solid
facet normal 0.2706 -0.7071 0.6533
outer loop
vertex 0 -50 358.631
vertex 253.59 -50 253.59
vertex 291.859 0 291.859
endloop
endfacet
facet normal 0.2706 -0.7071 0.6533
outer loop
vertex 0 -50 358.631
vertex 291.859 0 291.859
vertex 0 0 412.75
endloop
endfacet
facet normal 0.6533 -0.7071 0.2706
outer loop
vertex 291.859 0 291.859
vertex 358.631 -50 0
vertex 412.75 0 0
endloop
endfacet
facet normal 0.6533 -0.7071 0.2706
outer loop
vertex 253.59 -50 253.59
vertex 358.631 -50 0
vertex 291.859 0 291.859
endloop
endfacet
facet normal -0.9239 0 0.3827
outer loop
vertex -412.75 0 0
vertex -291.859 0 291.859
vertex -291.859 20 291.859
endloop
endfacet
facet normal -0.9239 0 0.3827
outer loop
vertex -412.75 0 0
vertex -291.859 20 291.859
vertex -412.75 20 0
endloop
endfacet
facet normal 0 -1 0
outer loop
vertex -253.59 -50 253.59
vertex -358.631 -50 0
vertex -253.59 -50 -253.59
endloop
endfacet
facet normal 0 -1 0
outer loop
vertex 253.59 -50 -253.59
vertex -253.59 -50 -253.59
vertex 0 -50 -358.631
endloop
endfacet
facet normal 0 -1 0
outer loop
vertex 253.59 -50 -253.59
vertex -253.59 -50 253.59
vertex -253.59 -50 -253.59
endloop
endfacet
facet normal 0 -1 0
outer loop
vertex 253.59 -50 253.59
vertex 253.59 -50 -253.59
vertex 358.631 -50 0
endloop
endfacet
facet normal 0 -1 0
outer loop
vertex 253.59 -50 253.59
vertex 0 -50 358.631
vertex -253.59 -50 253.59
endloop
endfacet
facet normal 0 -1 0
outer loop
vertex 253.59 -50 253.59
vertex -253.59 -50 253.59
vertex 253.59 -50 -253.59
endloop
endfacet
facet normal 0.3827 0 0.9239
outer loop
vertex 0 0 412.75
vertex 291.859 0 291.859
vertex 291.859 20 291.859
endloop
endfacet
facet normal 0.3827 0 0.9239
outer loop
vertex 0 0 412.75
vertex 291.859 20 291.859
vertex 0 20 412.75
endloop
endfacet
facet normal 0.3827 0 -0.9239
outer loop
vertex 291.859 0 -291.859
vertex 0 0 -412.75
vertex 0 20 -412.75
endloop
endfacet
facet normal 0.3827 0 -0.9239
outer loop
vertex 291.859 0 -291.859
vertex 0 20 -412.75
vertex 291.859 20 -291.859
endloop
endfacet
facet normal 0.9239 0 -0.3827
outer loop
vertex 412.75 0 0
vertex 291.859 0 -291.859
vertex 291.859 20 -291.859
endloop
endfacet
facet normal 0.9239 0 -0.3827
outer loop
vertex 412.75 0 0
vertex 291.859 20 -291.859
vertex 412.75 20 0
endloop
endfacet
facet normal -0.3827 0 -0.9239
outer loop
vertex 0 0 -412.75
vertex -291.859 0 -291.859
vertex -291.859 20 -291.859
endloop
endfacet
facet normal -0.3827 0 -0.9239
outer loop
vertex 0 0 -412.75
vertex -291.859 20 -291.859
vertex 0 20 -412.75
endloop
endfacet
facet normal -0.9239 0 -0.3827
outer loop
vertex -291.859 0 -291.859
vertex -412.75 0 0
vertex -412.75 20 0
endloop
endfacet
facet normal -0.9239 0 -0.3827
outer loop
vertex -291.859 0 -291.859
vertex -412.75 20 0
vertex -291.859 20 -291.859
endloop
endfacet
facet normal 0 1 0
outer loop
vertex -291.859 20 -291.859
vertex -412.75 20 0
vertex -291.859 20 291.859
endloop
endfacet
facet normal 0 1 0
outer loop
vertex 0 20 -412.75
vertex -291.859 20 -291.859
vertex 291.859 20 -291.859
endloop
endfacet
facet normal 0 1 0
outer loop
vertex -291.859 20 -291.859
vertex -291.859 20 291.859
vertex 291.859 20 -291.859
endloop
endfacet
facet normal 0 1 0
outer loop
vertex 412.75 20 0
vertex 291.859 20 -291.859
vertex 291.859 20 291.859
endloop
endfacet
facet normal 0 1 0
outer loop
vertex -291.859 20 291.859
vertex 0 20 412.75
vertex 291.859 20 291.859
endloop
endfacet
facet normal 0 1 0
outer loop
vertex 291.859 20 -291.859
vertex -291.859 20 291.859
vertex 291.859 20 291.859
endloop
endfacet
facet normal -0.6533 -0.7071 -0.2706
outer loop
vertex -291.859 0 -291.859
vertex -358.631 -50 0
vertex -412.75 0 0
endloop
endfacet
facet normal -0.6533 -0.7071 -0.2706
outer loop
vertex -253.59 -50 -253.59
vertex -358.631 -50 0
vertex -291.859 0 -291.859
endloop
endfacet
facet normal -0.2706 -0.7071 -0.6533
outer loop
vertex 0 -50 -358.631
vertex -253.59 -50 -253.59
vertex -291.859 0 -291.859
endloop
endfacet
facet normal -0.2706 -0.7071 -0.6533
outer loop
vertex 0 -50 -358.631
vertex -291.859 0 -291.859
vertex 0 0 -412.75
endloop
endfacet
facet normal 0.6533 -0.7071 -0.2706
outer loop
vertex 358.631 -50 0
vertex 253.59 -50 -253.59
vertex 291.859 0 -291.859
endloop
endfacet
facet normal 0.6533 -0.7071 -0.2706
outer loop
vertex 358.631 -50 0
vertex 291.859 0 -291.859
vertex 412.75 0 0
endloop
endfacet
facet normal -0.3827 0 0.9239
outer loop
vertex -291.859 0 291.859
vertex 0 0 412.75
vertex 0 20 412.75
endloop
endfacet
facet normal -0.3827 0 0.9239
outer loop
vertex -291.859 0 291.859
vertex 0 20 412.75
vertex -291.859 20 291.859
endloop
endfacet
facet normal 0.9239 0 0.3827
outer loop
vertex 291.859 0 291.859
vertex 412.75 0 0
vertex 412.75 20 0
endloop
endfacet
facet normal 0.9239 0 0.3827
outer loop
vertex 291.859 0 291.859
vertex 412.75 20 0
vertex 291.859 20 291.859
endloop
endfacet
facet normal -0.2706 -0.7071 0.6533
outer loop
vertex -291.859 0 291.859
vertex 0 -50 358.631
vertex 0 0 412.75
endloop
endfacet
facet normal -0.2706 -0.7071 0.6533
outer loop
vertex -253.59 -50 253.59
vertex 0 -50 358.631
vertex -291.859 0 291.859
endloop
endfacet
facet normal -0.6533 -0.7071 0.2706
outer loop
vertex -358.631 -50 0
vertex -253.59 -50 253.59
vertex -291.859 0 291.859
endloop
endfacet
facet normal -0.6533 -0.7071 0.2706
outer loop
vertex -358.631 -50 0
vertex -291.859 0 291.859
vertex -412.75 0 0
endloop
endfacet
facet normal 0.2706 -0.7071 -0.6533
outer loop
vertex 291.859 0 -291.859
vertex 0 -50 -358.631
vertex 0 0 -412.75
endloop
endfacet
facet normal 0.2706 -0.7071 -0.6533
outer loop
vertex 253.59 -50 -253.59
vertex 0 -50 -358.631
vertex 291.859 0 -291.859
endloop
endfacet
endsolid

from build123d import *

# Parameters (mm, degrees)
F1_DEPTH = 50
F2_SIZE  = 49.99999
F3_DEPTH = 20


# Not quite as in the source:
# - a fillet or chamfer is up to 0.001 mm smaller than in the source, because OpenCascade refuses the exact size


with BuildPart() as f1:
    # F0 (on Front) → F1 (new body)
    with BuildSketch(Plane.XZ):
        Polygon((291.8585808619, -291.8585808619), (412.7503633499, 0), (291.8585808619, 291.8585808619), (0, 412.7503633499), (-291.8585808619, 291.8585808619), (-412.7503633499, 0), (-291.8585808619, -291.8585808619), (0, -412.7503633499), align=None)
    extrude(amount=F1_DEPTH)

    # F2 (size 50 in the source; OpenCascade refuses exactly that, so slightly less here)
    f2_edges = [f1.edges().sort_by_distance(p)[0] for p in [
        (-352.304472, -50, -145.92929),
        (-145.92929, -50, -352.304472),
        (145.92929, -50, -352.304472),
        (352.304472, -50, -145.92929),
        (352.304472, -50, 145.92929),
        (145.92929, -50, 352.304472),
        (-145.92929, -50, 352.304472),
        (-352.304472, -50, 145.92929),
    ]]
    chamfer(f2_edges, length=F2_SIZE)

    # F0 (on Front) → F3 (join)
    with BuildSketch(Plane.XZ):
        Polygon((291.8585808619, -291.8585808619), (412.7503633499, 0), (291.8585808619, 291.8585808619), (0, 412.7503633499), (-291.8585808619, 291.8585808619), (-412.7503633499, 0), (-291.8585808619, -291.8585808619), (0, -412.7503633499), align=None)
    extrude(amount=-F3_DEPTH)


solid = f1.part
